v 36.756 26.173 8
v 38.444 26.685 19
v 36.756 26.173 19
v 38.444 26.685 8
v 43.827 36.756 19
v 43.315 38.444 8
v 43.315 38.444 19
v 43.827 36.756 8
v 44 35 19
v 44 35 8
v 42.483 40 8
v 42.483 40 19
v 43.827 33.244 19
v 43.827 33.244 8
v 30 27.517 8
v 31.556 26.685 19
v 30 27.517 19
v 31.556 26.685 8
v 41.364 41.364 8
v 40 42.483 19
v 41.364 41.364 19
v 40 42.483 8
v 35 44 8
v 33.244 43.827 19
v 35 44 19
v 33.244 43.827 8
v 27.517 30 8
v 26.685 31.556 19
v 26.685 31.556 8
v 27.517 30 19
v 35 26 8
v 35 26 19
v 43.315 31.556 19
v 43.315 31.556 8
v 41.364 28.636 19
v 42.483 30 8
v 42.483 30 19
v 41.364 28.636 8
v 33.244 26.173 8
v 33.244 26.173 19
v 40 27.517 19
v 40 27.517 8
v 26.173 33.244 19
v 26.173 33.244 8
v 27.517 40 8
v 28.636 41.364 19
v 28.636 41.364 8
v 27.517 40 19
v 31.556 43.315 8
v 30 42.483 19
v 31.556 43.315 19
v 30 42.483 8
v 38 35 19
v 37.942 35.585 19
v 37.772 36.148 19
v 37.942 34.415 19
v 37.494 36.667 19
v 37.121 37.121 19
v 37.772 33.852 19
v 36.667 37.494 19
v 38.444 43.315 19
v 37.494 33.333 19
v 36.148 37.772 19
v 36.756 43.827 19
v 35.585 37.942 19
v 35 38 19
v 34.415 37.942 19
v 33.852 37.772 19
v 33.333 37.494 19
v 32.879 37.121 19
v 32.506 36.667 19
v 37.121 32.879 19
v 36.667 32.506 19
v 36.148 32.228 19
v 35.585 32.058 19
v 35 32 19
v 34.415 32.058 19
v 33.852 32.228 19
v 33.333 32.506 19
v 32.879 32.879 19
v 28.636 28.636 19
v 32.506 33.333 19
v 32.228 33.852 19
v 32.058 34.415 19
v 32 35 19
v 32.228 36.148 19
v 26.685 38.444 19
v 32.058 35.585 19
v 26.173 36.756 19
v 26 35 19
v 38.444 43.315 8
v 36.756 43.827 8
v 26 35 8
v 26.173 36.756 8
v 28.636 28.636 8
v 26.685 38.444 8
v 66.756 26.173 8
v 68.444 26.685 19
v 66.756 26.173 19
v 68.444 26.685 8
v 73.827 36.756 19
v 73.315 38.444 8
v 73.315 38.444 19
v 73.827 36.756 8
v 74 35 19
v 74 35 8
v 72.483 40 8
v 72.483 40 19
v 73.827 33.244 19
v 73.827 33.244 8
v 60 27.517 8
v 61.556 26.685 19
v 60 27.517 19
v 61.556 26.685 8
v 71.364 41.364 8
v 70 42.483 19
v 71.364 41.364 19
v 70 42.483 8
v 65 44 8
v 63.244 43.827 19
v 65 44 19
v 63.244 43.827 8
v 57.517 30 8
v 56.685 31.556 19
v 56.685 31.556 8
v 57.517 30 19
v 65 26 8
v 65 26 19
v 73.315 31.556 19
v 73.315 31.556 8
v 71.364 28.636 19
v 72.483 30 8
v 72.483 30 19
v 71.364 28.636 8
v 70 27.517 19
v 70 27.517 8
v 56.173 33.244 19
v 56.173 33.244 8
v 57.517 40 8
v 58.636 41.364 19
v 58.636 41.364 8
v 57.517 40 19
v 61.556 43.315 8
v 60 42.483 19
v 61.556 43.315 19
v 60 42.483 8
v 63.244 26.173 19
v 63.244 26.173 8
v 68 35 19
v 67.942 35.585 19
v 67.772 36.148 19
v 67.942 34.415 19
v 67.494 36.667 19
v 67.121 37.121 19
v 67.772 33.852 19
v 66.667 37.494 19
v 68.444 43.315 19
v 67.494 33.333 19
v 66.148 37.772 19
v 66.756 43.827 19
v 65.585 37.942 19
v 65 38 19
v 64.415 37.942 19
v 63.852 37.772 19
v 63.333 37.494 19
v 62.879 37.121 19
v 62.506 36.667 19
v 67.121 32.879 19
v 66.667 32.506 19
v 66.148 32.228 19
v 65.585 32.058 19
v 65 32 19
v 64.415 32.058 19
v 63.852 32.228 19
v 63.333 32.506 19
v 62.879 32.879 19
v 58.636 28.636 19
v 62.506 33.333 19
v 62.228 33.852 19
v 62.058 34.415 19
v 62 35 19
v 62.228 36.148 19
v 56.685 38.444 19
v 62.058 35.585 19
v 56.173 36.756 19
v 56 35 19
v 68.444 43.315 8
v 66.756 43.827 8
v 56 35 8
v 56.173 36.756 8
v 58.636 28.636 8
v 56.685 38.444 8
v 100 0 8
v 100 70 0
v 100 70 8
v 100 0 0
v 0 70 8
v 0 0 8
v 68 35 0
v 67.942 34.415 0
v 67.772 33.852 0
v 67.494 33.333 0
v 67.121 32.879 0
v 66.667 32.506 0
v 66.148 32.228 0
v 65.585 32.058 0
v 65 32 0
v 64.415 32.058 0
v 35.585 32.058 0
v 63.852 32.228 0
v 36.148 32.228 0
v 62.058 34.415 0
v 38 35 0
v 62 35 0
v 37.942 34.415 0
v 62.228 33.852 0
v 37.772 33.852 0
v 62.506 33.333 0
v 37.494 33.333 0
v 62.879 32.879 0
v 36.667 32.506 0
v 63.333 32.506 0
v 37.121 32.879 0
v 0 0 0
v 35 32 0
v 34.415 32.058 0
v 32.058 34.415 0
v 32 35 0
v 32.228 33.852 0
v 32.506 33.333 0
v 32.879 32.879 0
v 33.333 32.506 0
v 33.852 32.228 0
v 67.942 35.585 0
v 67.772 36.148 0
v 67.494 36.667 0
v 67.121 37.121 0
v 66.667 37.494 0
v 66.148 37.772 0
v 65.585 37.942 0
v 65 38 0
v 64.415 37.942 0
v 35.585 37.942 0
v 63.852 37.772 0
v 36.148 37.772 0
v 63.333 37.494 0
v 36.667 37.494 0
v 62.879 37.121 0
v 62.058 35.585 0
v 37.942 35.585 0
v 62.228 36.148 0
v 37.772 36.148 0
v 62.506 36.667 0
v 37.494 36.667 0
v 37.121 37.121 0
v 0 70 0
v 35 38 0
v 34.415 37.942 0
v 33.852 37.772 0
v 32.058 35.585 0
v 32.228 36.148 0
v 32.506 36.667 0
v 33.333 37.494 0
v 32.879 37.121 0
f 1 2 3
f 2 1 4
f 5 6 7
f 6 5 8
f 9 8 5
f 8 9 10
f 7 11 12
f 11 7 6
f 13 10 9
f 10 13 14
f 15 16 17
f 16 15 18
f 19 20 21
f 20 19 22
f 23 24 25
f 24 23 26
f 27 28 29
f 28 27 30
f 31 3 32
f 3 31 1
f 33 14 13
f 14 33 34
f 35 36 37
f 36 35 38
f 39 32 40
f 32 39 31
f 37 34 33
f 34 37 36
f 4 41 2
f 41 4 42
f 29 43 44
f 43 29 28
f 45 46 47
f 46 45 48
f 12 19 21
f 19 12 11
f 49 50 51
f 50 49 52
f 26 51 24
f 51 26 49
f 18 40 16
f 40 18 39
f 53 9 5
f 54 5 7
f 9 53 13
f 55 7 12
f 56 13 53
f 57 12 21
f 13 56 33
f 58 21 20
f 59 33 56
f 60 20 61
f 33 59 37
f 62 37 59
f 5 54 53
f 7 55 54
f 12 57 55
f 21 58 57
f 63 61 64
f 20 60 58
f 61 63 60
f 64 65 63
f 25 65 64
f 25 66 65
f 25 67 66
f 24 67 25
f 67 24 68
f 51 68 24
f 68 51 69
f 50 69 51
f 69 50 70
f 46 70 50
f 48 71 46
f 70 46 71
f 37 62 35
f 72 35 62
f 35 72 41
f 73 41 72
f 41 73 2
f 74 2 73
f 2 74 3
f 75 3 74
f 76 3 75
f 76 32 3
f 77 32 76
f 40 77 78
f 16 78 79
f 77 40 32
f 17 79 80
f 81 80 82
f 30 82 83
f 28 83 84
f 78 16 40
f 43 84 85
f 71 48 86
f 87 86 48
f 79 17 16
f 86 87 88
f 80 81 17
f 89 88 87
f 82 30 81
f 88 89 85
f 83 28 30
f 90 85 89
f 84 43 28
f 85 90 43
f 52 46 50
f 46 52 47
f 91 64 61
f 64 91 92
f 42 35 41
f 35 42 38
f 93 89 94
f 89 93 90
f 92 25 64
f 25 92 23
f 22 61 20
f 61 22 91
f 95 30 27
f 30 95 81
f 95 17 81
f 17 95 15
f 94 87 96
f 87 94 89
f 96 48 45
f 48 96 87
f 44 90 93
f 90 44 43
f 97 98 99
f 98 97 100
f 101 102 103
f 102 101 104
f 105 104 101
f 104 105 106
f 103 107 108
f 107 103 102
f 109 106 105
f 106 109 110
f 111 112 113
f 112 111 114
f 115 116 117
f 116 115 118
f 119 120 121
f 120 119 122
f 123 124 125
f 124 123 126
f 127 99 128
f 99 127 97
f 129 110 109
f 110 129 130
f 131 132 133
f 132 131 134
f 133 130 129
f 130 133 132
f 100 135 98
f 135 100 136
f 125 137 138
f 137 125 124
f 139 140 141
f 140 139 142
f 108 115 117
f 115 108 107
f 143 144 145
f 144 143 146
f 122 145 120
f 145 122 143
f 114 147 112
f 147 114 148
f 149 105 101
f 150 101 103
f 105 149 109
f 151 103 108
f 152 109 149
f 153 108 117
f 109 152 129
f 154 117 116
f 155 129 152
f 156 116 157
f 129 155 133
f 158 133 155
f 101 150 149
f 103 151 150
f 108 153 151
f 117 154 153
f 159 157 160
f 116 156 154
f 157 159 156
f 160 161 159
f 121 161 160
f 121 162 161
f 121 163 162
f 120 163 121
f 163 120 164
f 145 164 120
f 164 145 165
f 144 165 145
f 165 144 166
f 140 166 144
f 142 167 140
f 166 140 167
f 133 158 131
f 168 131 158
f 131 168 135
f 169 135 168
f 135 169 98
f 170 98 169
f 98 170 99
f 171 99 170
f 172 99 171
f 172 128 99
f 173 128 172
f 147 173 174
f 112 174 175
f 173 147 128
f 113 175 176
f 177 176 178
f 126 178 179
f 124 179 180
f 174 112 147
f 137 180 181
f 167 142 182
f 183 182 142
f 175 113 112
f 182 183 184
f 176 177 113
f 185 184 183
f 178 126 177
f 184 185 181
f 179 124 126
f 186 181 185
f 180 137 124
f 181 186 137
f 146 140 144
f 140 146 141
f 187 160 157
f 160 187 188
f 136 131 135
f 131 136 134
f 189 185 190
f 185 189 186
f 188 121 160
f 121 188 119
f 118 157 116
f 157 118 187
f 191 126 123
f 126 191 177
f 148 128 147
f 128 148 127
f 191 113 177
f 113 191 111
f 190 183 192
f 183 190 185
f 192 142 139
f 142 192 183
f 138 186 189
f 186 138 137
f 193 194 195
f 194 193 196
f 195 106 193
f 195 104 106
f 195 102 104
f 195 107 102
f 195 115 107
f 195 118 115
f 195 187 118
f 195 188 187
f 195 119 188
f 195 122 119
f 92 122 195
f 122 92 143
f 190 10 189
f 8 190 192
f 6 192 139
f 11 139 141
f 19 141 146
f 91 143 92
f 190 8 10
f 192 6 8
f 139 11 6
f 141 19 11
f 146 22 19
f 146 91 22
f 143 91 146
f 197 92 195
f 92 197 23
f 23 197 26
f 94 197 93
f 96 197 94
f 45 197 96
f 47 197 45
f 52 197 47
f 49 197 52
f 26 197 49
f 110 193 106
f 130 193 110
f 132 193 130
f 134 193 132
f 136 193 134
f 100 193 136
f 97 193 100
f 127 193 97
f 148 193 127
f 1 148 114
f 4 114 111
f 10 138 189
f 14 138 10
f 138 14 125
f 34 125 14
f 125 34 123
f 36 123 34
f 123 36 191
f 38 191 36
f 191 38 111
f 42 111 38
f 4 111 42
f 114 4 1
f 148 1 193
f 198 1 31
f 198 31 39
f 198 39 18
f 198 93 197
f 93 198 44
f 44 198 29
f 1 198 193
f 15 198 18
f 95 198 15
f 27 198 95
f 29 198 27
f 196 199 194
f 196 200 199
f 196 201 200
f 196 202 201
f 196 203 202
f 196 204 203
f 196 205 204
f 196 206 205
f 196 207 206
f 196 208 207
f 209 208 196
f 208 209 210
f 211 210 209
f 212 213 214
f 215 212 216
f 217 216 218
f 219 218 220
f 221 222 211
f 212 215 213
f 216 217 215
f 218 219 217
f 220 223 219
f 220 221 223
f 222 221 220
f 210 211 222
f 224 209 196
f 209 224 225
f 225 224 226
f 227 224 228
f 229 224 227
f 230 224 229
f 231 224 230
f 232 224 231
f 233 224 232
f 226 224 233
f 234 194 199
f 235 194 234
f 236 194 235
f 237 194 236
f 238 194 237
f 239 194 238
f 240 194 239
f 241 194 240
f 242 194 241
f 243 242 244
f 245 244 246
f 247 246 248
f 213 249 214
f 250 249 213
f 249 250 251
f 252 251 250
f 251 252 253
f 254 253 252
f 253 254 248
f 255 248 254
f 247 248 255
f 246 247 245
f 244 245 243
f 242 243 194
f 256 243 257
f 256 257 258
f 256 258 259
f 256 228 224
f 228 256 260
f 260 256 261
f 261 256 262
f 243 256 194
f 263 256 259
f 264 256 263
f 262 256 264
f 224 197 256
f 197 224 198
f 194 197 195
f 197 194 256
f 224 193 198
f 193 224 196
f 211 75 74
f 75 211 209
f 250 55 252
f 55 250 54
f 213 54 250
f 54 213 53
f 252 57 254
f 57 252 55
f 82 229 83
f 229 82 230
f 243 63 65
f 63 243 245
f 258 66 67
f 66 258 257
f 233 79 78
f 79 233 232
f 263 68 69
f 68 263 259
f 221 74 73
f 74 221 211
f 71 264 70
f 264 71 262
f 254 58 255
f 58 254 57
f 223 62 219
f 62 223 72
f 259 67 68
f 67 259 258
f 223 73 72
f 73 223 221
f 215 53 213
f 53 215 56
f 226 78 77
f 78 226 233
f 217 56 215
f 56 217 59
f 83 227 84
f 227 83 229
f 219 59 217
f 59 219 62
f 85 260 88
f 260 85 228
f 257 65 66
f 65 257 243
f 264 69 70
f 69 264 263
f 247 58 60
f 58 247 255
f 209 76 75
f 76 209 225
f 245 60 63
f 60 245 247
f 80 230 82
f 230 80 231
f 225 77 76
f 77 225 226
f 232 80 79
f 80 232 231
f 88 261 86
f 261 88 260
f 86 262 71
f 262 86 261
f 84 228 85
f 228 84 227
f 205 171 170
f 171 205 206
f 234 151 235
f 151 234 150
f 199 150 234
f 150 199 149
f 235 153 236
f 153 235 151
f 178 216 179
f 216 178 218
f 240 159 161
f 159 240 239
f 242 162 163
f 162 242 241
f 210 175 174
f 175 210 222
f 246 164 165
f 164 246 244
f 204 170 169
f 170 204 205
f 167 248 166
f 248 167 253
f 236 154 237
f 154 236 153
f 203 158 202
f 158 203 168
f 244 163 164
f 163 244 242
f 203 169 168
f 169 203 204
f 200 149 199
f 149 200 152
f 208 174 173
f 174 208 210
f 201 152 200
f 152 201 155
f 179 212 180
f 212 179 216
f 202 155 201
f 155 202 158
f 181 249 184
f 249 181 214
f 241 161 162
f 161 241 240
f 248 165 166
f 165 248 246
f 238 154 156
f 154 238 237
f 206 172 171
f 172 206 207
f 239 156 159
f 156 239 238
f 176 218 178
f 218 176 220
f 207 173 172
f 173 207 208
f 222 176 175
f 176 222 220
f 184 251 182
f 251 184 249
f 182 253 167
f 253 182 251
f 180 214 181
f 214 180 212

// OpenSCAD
$fn = 32;

// ----------------------------------------------------------------------
// Drill jig: two_boss jig
// ----------------------------------------------------------------------

// --- parameters (mm) ---
plate_l = 100;            // plate length, X
plate_w = 70;             // plate width, Y
plate_t = 8;              // plate thickness
boss_d = 18;              // guide boss diameter
boss_h = 12;              // boss height above the plate
guide_d = 6;              // guide hole diameter
boss_pitch = 30;          // boss pitch
fit_tol = 0.1;            // tolerance for press fits, mm
free_tol = 0.3;           // tolerance for clearance fits, mm

n_boss = 2;  // guide bosses
boss_x0 = (plate_l - (n_boss - 1) * boss_pitch) / 2;  // first boss X
boss_top = plate_t - 1 + boss_h;  // boss crown height
total_h = boss_top;  // overall height

difference() {
  union() {
  cube([plate_l, plate_w, plate_t]);
  for (i = [0 : n_boss - 1])
    translate([boss_x0 + i * boss_pitch, plate_w / 2, plate_t - 1])
      cylinder(h = boss_h, d = boss_d);
  }
  for (i = [0 : n_boss - 1])
    translate([boss_x0 + i * boss_pitch, plate_w / 2, -1])
      cylinder(h = plate_t + boss_h, d = guide_d);
}
